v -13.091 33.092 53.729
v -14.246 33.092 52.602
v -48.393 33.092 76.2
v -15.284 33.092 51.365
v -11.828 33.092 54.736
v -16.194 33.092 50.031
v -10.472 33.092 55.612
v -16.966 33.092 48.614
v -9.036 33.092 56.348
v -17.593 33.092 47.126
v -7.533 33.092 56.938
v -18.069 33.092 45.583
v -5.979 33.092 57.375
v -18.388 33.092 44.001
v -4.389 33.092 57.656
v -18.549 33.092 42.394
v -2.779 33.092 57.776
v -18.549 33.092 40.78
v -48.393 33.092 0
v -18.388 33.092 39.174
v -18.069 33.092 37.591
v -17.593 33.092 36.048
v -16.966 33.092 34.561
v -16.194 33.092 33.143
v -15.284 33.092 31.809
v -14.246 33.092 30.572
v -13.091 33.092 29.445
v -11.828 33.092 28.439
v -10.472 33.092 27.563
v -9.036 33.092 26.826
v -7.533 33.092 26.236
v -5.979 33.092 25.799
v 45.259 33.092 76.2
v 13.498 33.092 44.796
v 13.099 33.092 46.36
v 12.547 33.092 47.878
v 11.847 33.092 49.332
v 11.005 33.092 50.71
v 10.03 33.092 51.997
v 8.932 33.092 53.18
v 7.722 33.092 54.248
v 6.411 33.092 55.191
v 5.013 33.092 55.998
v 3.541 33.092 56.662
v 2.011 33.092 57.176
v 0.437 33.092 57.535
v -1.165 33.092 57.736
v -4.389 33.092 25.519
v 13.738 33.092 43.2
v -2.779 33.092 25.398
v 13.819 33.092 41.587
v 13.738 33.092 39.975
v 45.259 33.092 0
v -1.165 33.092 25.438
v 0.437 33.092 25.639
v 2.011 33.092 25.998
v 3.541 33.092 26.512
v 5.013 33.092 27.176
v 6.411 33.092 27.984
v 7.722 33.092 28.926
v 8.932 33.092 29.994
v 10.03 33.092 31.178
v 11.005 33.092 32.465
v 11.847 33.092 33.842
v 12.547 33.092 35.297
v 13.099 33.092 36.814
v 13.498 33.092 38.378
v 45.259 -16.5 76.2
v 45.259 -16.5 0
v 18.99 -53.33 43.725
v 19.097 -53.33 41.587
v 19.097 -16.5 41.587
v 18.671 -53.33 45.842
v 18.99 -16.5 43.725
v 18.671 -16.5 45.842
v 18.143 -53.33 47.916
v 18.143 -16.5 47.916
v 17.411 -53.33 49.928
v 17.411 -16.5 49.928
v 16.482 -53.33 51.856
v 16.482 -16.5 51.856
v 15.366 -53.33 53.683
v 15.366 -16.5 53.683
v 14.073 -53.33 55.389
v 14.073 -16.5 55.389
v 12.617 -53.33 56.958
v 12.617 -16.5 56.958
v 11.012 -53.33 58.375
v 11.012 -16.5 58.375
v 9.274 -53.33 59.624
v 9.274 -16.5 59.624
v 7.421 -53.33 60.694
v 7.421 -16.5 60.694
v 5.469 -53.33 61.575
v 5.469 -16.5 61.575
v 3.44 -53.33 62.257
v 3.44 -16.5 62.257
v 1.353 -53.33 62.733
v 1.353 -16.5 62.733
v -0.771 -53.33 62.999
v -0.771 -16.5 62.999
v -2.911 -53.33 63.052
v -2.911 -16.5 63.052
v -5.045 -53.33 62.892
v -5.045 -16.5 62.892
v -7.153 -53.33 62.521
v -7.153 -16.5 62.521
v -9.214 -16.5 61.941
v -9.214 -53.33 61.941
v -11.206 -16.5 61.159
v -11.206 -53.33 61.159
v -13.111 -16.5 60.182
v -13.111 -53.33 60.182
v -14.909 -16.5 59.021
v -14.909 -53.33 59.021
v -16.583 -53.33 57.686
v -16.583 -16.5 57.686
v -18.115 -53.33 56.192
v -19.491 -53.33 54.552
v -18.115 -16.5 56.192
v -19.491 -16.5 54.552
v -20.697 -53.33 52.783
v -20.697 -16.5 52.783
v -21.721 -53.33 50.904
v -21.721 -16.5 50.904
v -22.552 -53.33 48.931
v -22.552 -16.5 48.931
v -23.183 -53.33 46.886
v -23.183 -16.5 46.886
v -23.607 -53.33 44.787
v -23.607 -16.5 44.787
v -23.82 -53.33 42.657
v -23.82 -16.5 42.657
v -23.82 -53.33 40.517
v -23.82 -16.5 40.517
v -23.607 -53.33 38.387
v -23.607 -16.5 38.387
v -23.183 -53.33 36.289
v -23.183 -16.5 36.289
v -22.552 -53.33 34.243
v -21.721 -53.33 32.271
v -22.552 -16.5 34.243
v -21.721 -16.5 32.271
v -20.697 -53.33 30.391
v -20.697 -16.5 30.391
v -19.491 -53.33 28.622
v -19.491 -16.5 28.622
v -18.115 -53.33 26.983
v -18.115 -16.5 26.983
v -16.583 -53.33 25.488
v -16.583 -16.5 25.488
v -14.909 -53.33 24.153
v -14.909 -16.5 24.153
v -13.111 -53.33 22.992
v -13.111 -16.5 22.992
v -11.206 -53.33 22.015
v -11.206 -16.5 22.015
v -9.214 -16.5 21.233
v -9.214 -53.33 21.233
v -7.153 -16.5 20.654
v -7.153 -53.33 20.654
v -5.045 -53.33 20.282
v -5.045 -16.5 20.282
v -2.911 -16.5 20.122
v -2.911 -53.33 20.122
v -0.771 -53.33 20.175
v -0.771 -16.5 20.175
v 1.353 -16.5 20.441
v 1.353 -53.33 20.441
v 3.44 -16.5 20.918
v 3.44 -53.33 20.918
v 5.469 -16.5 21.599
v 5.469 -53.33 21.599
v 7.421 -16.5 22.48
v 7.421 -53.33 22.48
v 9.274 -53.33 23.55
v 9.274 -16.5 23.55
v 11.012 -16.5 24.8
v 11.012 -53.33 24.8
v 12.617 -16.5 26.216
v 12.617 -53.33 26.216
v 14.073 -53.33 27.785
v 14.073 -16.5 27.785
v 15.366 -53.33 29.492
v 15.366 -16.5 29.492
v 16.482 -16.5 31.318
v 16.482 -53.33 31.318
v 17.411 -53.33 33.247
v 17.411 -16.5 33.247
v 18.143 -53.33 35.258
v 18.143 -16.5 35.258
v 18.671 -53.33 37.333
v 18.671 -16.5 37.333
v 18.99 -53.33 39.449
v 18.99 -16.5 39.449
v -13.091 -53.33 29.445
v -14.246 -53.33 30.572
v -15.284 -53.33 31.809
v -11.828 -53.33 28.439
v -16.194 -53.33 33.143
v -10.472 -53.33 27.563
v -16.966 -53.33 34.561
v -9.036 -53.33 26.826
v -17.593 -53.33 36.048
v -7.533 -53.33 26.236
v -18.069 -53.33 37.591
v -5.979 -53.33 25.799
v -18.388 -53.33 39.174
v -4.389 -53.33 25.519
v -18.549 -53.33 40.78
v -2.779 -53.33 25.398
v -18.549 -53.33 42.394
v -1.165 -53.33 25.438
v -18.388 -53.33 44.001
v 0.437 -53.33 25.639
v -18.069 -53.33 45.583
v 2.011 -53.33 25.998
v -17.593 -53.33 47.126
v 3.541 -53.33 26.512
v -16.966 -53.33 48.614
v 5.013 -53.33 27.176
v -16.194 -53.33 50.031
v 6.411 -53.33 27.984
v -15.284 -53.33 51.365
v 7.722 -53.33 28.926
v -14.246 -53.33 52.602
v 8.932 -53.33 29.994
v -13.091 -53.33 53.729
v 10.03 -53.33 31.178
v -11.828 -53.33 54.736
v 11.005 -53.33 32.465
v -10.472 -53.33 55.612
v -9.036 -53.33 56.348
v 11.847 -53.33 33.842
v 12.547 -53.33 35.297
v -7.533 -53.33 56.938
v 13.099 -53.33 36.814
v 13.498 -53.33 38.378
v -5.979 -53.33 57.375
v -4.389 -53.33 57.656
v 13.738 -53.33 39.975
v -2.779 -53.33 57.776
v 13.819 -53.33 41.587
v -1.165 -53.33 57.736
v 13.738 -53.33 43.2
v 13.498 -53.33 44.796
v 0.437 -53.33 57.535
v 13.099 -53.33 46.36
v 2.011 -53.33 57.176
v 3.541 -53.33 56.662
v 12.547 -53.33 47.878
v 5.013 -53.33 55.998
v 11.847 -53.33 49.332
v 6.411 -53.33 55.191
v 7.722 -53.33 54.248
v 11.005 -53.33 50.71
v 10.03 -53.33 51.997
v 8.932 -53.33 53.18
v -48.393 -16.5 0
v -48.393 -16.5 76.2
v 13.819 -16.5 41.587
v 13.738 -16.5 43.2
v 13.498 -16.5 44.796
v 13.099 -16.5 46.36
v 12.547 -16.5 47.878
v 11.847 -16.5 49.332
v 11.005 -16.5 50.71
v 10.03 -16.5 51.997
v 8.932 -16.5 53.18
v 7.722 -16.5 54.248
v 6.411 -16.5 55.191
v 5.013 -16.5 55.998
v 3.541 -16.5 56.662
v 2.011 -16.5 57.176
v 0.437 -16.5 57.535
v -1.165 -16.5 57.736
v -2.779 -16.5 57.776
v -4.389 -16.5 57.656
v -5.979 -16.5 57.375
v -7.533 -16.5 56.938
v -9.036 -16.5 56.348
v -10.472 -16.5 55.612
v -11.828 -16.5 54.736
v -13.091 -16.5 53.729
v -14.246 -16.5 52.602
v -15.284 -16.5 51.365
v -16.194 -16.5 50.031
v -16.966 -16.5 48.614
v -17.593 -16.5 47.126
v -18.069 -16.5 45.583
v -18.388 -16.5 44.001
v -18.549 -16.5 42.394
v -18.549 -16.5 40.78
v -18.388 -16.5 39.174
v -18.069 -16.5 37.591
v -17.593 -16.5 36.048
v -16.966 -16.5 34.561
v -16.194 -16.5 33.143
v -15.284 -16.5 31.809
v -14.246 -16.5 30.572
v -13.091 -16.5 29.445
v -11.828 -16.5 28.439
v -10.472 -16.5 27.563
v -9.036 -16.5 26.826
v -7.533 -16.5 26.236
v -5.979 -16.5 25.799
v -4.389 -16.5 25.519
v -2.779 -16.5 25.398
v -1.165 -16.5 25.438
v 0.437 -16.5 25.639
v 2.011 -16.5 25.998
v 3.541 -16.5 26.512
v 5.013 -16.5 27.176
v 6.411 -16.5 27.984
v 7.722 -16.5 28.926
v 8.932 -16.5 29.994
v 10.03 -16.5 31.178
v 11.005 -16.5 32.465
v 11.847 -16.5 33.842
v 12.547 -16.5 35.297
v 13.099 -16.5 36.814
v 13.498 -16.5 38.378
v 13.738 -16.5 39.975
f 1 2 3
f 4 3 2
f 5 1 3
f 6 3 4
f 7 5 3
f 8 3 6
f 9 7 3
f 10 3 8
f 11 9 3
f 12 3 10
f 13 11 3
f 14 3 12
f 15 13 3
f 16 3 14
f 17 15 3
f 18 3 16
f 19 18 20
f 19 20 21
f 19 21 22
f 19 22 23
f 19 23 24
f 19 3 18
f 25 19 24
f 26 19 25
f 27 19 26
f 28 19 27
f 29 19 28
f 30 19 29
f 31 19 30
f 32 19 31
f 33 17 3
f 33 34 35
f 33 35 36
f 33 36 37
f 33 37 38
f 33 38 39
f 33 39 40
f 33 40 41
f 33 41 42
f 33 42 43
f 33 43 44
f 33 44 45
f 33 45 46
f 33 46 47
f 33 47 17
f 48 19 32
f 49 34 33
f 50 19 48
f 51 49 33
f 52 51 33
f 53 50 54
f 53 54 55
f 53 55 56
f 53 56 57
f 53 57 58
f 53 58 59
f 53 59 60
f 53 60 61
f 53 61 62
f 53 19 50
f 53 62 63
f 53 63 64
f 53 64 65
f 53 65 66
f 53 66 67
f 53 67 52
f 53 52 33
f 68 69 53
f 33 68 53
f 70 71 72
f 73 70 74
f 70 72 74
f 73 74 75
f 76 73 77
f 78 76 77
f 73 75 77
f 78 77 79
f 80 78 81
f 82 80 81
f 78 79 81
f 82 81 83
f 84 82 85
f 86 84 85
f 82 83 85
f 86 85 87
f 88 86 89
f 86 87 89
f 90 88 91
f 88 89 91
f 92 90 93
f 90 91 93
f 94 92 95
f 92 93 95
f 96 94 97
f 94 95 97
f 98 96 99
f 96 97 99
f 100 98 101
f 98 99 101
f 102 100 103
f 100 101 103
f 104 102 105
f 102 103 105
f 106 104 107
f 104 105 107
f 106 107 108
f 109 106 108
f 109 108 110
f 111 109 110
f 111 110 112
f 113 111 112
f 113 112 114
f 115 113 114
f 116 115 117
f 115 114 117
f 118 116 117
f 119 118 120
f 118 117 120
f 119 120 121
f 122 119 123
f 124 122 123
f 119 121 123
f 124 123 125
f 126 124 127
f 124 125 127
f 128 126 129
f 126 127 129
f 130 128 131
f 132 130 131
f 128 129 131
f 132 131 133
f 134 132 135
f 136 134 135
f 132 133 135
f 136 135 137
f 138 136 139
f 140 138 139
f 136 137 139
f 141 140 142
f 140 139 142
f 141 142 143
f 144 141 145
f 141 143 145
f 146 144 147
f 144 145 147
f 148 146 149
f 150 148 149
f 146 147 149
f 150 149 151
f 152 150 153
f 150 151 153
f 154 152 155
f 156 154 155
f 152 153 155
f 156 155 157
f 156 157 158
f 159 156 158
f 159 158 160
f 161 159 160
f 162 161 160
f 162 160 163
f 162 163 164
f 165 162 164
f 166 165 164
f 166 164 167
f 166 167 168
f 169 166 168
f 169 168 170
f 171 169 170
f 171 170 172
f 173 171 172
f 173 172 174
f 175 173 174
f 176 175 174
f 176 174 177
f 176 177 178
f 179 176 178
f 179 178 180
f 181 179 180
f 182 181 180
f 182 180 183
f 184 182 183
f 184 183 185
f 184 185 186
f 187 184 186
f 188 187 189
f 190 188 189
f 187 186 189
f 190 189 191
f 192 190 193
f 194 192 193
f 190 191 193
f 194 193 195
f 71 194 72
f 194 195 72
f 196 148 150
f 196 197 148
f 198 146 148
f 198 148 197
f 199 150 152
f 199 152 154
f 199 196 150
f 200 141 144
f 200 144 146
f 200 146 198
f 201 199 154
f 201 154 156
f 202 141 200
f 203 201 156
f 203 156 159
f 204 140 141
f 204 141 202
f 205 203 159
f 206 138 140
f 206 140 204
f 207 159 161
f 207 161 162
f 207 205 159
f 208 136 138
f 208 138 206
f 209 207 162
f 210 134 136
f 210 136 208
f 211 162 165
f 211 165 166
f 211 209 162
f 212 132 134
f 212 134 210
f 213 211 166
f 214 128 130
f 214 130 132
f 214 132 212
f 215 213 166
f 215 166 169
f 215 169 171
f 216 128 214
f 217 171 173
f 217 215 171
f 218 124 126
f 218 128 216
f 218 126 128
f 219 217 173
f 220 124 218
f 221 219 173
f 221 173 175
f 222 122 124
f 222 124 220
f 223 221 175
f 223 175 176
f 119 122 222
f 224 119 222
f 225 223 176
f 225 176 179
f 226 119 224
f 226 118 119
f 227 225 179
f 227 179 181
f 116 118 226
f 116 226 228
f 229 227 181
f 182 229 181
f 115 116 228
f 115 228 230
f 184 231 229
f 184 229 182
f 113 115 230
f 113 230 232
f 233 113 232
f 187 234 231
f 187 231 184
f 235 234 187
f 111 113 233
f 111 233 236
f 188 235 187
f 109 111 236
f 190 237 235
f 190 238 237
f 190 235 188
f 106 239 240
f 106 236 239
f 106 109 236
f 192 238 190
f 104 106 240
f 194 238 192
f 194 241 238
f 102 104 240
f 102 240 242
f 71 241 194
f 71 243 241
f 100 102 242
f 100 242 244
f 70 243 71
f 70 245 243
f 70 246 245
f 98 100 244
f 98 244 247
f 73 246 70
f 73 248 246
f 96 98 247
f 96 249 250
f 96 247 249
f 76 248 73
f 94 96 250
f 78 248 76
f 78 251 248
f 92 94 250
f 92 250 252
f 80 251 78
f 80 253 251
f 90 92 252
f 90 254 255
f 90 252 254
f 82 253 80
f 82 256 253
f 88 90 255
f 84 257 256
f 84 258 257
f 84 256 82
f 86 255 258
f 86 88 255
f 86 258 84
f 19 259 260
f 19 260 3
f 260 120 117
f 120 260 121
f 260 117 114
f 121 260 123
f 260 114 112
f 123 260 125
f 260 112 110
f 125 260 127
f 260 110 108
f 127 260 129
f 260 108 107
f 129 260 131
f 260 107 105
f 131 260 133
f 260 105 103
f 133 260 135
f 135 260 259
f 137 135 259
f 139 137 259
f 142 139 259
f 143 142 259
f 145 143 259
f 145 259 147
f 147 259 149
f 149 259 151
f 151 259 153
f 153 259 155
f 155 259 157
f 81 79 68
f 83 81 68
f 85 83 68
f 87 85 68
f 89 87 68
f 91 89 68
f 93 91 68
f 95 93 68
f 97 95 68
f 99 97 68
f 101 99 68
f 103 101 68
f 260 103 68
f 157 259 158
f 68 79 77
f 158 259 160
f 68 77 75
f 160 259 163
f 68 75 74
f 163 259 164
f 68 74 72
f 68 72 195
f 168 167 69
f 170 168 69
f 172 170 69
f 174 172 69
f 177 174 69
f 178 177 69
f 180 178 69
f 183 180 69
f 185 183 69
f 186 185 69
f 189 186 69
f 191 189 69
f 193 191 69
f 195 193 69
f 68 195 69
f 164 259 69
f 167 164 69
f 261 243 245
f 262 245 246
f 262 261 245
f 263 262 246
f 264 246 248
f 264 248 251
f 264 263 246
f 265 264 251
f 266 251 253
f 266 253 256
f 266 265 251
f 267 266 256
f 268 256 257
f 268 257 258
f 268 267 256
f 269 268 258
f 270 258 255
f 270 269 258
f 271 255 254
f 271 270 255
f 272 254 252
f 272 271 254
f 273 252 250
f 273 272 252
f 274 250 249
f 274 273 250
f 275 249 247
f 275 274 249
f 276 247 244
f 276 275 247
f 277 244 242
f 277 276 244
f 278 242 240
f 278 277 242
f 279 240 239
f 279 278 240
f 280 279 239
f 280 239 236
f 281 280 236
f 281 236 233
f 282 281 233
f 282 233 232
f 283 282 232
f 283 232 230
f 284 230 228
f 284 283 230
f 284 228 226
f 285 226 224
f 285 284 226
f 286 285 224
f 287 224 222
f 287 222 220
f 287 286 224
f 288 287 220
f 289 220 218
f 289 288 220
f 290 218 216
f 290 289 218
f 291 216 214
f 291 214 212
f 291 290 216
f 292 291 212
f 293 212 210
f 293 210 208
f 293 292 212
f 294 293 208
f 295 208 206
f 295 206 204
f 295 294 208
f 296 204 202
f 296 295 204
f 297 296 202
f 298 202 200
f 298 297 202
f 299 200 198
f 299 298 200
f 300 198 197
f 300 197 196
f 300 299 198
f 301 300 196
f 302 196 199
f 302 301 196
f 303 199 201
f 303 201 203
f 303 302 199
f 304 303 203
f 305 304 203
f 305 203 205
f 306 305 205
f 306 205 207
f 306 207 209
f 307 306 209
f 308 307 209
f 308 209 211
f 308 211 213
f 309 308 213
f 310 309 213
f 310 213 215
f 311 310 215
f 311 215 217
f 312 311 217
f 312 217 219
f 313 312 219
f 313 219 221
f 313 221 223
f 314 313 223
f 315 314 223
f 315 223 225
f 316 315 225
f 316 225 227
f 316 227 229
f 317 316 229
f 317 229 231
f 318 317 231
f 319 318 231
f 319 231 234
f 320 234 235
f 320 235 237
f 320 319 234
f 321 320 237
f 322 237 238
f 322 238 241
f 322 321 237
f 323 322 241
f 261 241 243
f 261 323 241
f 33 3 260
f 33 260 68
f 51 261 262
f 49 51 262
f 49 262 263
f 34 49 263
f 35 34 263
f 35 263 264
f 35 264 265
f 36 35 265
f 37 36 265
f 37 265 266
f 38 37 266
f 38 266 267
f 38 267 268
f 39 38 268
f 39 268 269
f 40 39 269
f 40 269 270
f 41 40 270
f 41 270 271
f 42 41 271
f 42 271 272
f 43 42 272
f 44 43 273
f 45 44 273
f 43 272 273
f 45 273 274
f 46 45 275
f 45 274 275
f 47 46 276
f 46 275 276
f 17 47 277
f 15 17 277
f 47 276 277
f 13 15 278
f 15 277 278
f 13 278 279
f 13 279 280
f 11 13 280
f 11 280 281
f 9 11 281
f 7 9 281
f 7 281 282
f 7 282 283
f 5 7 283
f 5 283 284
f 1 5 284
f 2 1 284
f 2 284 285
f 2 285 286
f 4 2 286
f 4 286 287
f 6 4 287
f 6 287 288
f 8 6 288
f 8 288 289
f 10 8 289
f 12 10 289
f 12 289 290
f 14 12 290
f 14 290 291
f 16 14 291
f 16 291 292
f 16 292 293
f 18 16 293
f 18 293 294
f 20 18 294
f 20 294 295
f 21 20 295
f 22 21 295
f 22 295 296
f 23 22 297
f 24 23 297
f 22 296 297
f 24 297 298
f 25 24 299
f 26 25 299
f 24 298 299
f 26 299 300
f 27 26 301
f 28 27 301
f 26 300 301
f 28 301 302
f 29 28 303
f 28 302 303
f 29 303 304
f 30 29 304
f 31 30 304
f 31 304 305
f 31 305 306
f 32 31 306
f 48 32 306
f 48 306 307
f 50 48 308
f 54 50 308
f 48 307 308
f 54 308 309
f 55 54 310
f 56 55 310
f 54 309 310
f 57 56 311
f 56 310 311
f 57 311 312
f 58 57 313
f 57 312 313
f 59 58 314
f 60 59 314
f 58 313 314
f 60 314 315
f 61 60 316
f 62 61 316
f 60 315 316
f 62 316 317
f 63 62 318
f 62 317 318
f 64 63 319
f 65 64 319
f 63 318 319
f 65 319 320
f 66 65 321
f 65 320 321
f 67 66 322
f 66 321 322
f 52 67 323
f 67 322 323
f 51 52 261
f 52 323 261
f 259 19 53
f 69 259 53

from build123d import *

# Parameters (mm, degrees)
F0_W     = 93.6522595584
F0_H     = 49.5914518833
F1_DEPTH = 76.2
F2_R     = 16.194136499
F3_DEPTH = 50.8
F4_R     = 21.4719665267
F4_R_2   = 16.194136499
F5_DEPTH = 36.83


with BuildPart() as f1:
    # F0 (on Top) → F1 (new body)
    with BuildSketch(Plane.XY):
        with Locations((-1.5670154244, 8.2959681749)):
            Rectangle(F0_W, F0_H)
    extrude(amount=F1_DEPTH)

    # F2 (on face) → F3 (cut)
    with BuildSketch(Plane.XZ.offset(16.4997577667)):
        with Locations((-2.3752143607, 41.5871702135)):
            Circle(F2_R)
    extrude(amount=-F3_DEPTH, mode=Mode.SUBTRACT)

    # F4 (on face) → F5 (join)
    with BuildSketch(Plane.XZ.offset(16.4997577667)):
        with Locations((-2.3752143607, 41.5871702135)):
            Circle(F4_R)
        with Locations((-2.3752143607, 41.5871702135)):
            Circle(F4_R_2, mode=Mode.SUBTRACT)
    extrude(amount=F5_DEPTH)


solid = f1.part
